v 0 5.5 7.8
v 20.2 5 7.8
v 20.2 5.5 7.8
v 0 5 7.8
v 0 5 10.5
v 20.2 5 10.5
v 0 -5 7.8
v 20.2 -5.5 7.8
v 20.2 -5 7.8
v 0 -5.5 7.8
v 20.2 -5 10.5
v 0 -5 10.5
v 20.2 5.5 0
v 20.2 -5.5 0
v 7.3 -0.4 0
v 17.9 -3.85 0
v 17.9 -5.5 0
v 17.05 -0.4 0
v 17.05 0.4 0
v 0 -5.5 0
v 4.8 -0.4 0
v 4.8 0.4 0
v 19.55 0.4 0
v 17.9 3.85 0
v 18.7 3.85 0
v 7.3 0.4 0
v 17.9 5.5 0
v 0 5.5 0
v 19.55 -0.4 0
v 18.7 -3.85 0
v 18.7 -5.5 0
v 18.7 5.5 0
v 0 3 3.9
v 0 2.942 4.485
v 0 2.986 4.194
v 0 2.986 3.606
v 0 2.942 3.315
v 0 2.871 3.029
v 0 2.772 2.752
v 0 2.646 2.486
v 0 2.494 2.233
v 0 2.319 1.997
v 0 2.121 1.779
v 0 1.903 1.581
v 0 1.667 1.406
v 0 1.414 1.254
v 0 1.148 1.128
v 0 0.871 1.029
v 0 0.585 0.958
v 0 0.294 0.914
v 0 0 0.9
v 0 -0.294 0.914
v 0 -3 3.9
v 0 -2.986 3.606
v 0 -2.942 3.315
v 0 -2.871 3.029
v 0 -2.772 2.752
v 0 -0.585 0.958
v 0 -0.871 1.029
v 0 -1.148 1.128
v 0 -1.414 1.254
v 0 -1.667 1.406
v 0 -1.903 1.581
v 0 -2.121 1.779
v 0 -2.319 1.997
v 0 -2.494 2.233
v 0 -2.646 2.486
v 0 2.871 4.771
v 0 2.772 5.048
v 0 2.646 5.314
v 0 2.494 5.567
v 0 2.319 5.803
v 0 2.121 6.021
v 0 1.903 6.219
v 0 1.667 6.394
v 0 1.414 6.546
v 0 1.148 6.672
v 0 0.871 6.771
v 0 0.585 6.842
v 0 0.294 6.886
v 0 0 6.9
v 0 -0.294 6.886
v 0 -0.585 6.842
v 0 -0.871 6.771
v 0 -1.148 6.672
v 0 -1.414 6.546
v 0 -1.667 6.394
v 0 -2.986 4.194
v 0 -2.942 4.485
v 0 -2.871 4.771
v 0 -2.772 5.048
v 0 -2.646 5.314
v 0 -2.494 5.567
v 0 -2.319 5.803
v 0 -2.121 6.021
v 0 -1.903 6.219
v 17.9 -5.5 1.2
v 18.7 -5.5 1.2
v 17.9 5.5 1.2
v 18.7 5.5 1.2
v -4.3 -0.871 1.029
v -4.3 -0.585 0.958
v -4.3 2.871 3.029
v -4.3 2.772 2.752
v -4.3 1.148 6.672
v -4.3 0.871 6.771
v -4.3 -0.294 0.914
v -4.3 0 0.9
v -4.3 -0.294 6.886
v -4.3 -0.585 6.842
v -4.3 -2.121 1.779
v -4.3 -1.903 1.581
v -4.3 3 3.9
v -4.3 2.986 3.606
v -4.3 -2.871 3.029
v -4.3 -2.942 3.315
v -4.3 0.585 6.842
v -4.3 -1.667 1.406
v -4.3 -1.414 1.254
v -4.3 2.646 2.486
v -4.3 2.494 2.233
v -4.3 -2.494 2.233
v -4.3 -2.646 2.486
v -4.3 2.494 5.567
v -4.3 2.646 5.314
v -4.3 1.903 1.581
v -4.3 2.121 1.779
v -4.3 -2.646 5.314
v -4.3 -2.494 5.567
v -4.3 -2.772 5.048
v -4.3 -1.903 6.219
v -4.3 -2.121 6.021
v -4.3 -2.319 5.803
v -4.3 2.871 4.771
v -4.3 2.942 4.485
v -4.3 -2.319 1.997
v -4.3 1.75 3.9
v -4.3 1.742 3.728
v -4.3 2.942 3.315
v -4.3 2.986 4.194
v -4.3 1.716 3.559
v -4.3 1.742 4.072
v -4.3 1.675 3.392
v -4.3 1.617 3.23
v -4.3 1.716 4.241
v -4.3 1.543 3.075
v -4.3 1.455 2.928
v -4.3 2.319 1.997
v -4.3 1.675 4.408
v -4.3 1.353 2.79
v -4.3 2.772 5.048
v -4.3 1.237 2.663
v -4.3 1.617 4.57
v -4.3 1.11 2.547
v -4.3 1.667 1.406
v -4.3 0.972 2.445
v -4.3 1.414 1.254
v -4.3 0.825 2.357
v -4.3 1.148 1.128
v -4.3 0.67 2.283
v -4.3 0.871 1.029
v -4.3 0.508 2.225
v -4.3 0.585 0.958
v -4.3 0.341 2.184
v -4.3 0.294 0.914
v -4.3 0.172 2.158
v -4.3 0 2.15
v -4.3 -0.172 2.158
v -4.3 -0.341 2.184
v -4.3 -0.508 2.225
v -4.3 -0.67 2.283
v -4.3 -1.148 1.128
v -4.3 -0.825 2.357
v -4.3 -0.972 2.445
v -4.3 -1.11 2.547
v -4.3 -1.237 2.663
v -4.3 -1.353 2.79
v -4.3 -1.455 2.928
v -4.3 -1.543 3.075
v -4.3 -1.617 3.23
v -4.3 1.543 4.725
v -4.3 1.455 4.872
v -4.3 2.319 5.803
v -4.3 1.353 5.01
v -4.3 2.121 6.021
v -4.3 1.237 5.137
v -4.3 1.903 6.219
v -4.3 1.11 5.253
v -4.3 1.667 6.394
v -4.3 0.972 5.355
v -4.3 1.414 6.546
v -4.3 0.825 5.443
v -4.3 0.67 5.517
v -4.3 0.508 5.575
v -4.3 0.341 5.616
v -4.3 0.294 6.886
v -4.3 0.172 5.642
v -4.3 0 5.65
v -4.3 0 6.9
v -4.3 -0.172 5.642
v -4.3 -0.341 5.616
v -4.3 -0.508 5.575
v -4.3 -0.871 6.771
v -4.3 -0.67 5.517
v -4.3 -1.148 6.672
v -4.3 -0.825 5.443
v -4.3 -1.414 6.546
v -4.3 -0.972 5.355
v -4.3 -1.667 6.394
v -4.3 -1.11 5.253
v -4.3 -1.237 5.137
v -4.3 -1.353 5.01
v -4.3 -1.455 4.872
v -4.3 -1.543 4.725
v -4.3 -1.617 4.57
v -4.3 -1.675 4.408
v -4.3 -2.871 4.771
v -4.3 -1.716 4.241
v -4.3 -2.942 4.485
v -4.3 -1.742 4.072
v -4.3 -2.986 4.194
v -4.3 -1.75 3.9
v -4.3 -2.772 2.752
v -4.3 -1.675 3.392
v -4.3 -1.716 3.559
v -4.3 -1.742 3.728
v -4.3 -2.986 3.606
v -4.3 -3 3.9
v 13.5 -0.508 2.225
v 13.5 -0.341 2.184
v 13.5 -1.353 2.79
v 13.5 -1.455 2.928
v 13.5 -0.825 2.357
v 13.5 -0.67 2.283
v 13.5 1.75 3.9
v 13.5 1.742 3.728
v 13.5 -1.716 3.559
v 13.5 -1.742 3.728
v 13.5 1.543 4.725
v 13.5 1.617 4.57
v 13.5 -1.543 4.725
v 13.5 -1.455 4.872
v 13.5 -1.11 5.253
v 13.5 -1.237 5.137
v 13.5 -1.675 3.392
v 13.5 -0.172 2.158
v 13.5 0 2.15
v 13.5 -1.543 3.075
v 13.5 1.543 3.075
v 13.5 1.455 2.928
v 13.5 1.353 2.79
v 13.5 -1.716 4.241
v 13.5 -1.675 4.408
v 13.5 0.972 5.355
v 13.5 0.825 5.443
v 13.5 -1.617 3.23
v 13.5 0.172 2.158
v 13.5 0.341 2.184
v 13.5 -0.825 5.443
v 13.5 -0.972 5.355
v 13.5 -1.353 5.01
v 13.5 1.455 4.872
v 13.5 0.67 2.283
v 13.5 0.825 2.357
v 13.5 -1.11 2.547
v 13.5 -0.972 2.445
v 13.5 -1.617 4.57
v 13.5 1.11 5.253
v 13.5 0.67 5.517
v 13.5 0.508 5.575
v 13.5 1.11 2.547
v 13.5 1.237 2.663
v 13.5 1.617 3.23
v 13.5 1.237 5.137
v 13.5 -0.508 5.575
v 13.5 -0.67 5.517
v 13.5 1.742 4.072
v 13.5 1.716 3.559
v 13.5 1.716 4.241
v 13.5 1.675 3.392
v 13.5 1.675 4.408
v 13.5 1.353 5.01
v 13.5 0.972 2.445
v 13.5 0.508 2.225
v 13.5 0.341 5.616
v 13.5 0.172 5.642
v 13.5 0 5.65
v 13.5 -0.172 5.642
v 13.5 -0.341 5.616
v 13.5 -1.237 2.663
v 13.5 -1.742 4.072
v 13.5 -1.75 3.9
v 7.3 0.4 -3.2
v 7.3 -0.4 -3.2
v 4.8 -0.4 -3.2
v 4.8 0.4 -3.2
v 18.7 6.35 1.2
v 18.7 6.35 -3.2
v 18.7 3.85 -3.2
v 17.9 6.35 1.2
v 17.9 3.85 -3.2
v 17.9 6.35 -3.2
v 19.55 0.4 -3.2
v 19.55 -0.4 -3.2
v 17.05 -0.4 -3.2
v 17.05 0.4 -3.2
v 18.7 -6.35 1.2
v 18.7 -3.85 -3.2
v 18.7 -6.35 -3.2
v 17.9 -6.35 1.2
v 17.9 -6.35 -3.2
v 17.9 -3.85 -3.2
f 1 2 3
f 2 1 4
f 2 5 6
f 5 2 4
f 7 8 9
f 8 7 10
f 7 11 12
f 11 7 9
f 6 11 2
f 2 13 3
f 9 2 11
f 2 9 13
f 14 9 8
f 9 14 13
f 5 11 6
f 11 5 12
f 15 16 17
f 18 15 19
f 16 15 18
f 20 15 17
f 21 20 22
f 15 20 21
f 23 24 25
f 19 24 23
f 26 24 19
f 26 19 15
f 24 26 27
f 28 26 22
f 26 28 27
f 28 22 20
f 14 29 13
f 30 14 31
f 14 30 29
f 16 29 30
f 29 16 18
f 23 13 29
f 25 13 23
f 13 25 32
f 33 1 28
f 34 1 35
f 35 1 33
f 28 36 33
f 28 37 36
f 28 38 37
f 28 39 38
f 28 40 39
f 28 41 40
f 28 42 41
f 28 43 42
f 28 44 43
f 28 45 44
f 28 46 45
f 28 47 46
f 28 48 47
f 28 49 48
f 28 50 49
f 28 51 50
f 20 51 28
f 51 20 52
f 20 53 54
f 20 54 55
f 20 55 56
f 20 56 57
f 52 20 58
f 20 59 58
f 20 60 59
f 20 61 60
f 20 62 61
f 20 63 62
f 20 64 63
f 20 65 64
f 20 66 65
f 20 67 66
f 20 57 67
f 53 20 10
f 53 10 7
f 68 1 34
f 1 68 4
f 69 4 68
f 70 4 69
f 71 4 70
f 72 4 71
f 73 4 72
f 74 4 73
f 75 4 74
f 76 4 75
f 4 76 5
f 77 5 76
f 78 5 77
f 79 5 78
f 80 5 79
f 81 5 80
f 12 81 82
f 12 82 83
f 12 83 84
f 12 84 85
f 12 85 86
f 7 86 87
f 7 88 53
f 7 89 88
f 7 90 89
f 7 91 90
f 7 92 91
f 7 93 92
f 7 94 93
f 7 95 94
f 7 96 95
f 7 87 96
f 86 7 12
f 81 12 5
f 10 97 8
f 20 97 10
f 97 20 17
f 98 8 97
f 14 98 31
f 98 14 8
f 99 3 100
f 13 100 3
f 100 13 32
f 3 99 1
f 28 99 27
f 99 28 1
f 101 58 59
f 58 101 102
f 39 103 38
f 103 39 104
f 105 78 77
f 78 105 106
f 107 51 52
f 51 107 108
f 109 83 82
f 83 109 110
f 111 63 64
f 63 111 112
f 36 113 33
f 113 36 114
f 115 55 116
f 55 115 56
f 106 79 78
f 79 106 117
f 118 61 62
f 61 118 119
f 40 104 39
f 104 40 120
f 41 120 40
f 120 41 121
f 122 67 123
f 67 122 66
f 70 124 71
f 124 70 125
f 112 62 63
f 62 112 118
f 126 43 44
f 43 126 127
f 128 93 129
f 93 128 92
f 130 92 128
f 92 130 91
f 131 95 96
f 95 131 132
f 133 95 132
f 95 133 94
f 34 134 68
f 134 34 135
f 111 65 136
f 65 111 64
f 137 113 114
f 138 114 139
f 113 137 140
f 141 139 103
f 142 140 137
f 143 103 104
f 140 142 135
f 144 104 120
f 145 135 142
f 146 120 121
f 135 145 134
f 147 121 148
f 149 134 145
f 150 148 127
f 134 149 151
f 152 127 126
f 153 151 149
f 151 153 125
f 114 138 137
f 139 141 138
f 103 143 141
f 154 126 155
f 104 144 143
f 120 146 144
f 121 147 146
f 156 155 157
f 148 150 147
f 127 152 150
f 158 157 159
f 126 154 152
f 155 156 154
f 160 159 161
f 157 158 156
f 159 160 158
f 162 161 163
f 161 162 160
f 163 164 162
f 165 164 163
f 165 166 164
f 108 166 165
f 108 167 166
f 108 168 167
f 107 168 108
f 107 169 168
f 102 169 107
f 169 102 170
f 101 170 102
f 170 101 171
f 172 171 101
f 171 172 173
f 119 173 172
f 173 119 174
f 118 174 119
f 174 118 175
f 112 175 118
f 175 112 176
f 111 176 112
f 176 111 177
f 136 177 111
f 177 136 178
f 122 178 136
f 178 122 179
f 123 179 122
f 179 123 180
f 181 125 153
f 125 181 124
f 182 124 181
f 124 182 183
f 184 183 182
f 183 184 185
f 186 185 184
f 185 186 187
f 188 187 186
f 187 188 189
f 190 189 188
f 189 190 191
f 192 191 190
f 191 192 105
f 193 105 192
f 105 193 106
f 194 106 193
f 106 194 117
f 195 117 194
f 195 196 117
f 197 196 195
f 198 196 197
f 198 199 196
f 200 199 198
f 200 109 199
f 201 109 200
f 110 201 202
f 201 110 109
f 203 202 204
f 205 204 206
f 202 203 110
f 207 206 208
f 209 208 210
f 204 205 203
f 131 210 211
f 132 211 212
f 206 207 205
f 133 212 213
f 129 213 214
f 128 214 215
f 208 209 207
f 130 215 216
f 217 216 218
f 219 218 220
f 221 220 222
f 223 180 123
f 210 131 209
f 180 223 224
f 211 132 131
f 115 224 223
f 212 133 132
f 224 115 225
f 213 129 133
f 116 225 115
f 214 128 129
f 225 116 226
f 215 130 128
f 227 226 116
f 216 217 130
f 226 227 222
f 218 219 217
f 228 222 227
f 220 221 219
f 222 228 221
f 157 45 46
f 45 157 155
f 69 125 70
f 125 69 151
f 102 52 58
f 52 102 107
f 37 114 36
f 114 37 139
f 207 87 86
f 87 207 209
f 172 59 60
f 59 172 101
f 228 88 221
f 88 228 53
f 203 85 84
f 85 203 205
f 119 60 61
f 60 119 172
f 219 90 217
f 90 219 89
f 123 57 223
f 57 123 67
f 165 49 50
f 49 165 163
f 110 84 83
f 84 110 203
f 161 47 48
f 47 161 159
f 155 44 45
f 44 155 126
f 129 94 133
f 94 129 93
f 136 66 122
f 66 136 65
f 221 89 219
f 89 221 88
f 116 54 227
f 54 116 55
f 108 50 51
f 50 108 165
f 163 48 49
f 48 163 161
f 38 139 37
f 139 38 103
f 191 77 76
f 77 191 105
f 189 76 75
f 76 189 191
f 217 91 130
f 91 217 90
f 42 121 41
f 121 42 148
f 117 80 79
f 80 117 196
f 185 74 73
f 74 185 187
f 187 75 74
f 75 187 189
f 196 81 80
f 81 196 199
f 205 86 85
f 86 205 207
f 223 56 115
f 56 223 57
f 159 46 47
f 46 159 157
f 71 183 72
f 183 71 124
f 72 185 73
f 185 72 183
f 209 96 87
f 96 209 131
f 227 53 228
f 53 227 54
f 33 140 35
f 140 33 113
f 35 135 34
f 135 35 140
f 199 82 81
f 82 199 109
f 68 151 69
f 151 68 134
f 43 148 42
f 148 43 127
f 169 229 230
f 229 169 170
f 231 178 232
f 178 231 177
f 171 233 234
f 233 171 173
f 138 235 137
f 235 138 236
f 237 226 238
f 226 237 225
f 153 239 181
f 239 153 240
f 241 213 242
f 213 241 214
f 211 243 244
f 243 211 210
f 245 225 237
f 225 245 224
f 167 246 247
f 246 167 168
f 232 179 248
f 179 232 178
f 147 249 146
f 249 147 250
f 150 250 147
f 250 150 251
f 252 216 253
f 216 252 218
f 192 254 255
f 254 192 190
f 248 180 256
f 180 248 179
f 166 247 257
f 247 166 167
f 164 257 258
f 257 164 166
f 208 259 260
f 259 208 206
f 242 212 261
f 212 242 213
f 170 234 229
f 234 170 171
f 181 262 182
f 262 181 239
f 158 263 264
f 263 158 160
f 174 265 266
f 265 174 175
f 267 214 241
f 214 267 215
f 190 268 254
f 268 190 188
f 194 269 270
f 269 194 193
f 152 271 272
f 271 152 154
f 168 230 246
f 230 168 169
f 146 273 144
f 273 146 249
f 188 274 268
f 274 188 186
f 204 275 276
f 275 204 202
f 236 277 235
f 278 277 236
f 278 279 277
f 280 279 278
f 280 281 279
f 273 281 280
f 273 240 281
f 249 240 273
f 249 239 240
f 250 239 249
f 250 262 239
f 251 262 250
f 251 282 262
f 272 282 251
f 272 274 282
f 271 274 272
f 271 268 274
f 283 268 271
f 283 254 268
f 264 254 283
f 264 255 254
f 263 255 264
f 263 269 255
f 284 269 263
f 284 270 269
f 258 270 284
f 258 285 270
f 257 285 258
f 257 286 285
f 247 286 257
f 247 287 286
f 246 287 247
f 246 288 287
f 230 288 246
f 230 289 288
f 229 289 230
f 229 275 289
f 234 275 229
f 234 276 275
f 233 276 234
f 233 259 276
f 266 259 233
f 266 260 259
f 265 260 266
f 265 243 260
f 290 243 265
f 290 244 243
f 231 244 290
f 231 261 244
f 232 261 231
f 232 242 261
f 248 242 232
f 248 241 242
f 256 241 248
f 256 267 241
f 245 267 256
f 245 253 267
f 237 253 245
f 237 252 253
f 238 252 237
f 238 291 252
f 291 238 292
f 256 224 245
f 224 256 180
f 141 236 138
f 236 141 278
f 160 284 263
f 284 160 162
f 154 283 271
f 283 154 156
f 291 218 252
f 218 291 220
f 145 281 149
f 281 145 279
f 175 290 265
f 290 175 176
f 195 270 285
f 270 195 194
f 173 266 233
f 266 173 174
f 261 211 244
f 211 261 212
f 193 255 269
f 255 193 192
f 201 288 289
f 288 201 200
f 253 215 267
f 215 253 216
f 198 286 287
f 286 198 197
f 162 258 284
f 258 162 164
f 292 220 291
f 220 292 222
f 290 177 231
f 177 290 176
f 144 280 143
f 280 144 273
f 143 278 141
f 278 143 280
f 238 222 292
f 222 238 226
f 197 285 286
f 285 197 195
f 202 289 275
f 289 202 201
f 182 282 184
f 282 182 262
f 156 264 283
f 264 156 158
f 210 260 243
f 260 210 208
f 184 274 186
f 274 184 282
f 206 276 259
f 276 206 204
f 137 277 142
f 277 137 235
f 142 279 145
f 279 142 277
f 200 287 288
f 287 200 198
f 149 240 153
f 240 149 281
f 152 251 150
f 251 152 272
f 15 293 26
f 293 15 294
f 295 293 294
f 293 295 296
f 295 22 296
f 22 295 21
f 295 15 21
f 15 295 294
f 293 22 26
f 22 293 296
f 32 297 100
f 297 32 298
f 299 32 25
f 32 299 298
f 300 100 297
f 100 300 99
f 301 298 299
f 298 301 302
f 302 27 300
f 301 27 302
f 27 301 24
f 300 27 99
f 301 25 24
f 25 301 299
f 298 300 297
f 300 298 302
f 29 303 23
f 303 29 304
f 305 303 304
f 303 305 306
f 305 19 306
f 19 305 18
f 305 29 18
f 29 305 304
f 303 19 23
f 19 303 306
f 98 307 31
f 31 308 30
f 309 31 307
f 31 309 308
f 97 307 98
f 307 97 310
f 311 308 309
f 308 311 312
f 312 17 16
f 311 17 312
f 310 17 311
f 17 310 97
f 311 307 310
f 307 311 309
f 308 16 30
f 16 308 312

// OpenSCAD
// QingPu WQP-WQP729JH-B — 3.5mm right-angle switched stereo (TRS) jack
// Approximate mechanical model for KiCad 3D viewer clearance checks.
// Datasheet: https://www.thonk.co.uk/wp-content/uploads/2022/10/WQP-WQP729JH.pdf
//
// Coordinate system matches the KiCad footprint local frame:
//   origin  = bushing / panel face (front face of the plastic body)
//   +X      = barrel axis, pointing back into the body (pins are at +X)
//   -X      = threaded barrel protrudes this way, out past the panel face
//   XY      = board plane, Z = up off the board surface (body sits on z = 0)
//
// NOTE: the exported mesh negates Y so that it lands correctly in KiCad's
// 3D frame, whose +Y is opposite the footprint's +Y. See kicad_frame() below.
//
// Dimensional honesty over cosmetic detail: threads are a plain cylinder,
// fillets and the internal switch leaf are omitted.

$fn = 64;

// ---- Body ------------------------------------------------------------------
body_len    = 20.2;   // X, panel face to rear face
body_wid    = 11.0;   // Y, full width (+/- 5.5)
body_tall   = 10.5;   // Z, total height above board surface

// Front view shows a 10 x 7.8 housing square with the bore centred in it.
house_wid   = 10.0;   // Y of the raised housing block
house_tall  = 7.8;    // Z of the raised housing block

// Bore axis height: centred in the 7.8 housing square.
bore_z      = house_tall / 2;

// ---- Threaded barrel -------------------------------------------------------
barrel_dia  = 6.0;    // M6 x 0.5 major diameter
barrel_out  = 4.3;    // protrusion in -X past the panel face
bore_dia    = 3.5;    // plug bore

// ---- Pins ------------------------------------------------------------------
pin_w       = 0.8;    // tab thickness
pin_l       = 2.5;    // tab width across
pin_drop    = 3.2;    // how far below z = 0 the tab reaches

// Pad locations in footprint local coordinates.
pin1 = [ 6.05,  0.0 ];   // Sleeve
pin2 = [18.30, -5.1 ];   // Ring
pin3 = [18.30,  0.0 ];   // Tip
pin4 = [18.30,  5.1 ];   // Shunt (normalled to tip)

// ---------------------------------------------------------------------------

module body_block() {
    // Full-width lower body...
    translate([0, -body_wid / 2, 0])
        cube([body_len, body_wid, body_tall]);
}

module housing_relief() {
    // ...with the corners above the 7.8 housing square cut back to 10 wide,
    // which is what the datasheet front view shows.
    for (s = [-1, 1])
        translate([-0.1, s > 0 ? house_wid / 2 : -house_wid / 2 - body_wid, house_tall])
            cube([body_len + 0.2, body_wid, body_tall]);
}

module barrel() {
    rotate([0, 90, 0])
        translate([0, 0, -barrel_out])
            cylinder(h = barrel_out + 2.0, d = barrel_dia);
}

module bore() {
    // Plug bore, drilled from the panel face back into the body.
    translate([-barrel_out - 0.5, 0, 0])
        rotate([0, 90, 0])
            cylinder(h = barrel_out + 14.0, d = bore_dia);
}

module pin_tab(pos, along_x) {
    // Flat tab dropping through the board. `along_x` orients the 2.5 mm
    // dimension along X (pins 1 and 3) rather than along Y (pins 2 and 4).
    sz = along_x ? [pin_l, pin_w, pin_drop + 1.2]
                 : [pin_w, pin_l, pin_drop + 1.2];
    translate([pos[0] - sz[0] / 2, pos[1] - sz[1] / 2, -pin_drop])
        cube(sz);
}

module jack() {
    union() {
        difference() {
            union() {
                difference() {
                    body_block();
                    housing_relief();
                }
                translate([0, 0, bore_z]) barrel();
            }
            translate([0, 0, bore_z]) bore();
        }
        pin_tab(pin1, true);
        pin_tab(pin2, false);
        pin_tab(pin3, true);
        pin_tab(pin4, false);
    }
}

// KiCad's 3D model frame has +Y opposite the footprint's +Y, so mirror Y
// on export. Everything above is authored in footprint coordinates.
module kicad_frame() { mirror([0, 1, 0]) children(); }

kicad_frame() jack();
